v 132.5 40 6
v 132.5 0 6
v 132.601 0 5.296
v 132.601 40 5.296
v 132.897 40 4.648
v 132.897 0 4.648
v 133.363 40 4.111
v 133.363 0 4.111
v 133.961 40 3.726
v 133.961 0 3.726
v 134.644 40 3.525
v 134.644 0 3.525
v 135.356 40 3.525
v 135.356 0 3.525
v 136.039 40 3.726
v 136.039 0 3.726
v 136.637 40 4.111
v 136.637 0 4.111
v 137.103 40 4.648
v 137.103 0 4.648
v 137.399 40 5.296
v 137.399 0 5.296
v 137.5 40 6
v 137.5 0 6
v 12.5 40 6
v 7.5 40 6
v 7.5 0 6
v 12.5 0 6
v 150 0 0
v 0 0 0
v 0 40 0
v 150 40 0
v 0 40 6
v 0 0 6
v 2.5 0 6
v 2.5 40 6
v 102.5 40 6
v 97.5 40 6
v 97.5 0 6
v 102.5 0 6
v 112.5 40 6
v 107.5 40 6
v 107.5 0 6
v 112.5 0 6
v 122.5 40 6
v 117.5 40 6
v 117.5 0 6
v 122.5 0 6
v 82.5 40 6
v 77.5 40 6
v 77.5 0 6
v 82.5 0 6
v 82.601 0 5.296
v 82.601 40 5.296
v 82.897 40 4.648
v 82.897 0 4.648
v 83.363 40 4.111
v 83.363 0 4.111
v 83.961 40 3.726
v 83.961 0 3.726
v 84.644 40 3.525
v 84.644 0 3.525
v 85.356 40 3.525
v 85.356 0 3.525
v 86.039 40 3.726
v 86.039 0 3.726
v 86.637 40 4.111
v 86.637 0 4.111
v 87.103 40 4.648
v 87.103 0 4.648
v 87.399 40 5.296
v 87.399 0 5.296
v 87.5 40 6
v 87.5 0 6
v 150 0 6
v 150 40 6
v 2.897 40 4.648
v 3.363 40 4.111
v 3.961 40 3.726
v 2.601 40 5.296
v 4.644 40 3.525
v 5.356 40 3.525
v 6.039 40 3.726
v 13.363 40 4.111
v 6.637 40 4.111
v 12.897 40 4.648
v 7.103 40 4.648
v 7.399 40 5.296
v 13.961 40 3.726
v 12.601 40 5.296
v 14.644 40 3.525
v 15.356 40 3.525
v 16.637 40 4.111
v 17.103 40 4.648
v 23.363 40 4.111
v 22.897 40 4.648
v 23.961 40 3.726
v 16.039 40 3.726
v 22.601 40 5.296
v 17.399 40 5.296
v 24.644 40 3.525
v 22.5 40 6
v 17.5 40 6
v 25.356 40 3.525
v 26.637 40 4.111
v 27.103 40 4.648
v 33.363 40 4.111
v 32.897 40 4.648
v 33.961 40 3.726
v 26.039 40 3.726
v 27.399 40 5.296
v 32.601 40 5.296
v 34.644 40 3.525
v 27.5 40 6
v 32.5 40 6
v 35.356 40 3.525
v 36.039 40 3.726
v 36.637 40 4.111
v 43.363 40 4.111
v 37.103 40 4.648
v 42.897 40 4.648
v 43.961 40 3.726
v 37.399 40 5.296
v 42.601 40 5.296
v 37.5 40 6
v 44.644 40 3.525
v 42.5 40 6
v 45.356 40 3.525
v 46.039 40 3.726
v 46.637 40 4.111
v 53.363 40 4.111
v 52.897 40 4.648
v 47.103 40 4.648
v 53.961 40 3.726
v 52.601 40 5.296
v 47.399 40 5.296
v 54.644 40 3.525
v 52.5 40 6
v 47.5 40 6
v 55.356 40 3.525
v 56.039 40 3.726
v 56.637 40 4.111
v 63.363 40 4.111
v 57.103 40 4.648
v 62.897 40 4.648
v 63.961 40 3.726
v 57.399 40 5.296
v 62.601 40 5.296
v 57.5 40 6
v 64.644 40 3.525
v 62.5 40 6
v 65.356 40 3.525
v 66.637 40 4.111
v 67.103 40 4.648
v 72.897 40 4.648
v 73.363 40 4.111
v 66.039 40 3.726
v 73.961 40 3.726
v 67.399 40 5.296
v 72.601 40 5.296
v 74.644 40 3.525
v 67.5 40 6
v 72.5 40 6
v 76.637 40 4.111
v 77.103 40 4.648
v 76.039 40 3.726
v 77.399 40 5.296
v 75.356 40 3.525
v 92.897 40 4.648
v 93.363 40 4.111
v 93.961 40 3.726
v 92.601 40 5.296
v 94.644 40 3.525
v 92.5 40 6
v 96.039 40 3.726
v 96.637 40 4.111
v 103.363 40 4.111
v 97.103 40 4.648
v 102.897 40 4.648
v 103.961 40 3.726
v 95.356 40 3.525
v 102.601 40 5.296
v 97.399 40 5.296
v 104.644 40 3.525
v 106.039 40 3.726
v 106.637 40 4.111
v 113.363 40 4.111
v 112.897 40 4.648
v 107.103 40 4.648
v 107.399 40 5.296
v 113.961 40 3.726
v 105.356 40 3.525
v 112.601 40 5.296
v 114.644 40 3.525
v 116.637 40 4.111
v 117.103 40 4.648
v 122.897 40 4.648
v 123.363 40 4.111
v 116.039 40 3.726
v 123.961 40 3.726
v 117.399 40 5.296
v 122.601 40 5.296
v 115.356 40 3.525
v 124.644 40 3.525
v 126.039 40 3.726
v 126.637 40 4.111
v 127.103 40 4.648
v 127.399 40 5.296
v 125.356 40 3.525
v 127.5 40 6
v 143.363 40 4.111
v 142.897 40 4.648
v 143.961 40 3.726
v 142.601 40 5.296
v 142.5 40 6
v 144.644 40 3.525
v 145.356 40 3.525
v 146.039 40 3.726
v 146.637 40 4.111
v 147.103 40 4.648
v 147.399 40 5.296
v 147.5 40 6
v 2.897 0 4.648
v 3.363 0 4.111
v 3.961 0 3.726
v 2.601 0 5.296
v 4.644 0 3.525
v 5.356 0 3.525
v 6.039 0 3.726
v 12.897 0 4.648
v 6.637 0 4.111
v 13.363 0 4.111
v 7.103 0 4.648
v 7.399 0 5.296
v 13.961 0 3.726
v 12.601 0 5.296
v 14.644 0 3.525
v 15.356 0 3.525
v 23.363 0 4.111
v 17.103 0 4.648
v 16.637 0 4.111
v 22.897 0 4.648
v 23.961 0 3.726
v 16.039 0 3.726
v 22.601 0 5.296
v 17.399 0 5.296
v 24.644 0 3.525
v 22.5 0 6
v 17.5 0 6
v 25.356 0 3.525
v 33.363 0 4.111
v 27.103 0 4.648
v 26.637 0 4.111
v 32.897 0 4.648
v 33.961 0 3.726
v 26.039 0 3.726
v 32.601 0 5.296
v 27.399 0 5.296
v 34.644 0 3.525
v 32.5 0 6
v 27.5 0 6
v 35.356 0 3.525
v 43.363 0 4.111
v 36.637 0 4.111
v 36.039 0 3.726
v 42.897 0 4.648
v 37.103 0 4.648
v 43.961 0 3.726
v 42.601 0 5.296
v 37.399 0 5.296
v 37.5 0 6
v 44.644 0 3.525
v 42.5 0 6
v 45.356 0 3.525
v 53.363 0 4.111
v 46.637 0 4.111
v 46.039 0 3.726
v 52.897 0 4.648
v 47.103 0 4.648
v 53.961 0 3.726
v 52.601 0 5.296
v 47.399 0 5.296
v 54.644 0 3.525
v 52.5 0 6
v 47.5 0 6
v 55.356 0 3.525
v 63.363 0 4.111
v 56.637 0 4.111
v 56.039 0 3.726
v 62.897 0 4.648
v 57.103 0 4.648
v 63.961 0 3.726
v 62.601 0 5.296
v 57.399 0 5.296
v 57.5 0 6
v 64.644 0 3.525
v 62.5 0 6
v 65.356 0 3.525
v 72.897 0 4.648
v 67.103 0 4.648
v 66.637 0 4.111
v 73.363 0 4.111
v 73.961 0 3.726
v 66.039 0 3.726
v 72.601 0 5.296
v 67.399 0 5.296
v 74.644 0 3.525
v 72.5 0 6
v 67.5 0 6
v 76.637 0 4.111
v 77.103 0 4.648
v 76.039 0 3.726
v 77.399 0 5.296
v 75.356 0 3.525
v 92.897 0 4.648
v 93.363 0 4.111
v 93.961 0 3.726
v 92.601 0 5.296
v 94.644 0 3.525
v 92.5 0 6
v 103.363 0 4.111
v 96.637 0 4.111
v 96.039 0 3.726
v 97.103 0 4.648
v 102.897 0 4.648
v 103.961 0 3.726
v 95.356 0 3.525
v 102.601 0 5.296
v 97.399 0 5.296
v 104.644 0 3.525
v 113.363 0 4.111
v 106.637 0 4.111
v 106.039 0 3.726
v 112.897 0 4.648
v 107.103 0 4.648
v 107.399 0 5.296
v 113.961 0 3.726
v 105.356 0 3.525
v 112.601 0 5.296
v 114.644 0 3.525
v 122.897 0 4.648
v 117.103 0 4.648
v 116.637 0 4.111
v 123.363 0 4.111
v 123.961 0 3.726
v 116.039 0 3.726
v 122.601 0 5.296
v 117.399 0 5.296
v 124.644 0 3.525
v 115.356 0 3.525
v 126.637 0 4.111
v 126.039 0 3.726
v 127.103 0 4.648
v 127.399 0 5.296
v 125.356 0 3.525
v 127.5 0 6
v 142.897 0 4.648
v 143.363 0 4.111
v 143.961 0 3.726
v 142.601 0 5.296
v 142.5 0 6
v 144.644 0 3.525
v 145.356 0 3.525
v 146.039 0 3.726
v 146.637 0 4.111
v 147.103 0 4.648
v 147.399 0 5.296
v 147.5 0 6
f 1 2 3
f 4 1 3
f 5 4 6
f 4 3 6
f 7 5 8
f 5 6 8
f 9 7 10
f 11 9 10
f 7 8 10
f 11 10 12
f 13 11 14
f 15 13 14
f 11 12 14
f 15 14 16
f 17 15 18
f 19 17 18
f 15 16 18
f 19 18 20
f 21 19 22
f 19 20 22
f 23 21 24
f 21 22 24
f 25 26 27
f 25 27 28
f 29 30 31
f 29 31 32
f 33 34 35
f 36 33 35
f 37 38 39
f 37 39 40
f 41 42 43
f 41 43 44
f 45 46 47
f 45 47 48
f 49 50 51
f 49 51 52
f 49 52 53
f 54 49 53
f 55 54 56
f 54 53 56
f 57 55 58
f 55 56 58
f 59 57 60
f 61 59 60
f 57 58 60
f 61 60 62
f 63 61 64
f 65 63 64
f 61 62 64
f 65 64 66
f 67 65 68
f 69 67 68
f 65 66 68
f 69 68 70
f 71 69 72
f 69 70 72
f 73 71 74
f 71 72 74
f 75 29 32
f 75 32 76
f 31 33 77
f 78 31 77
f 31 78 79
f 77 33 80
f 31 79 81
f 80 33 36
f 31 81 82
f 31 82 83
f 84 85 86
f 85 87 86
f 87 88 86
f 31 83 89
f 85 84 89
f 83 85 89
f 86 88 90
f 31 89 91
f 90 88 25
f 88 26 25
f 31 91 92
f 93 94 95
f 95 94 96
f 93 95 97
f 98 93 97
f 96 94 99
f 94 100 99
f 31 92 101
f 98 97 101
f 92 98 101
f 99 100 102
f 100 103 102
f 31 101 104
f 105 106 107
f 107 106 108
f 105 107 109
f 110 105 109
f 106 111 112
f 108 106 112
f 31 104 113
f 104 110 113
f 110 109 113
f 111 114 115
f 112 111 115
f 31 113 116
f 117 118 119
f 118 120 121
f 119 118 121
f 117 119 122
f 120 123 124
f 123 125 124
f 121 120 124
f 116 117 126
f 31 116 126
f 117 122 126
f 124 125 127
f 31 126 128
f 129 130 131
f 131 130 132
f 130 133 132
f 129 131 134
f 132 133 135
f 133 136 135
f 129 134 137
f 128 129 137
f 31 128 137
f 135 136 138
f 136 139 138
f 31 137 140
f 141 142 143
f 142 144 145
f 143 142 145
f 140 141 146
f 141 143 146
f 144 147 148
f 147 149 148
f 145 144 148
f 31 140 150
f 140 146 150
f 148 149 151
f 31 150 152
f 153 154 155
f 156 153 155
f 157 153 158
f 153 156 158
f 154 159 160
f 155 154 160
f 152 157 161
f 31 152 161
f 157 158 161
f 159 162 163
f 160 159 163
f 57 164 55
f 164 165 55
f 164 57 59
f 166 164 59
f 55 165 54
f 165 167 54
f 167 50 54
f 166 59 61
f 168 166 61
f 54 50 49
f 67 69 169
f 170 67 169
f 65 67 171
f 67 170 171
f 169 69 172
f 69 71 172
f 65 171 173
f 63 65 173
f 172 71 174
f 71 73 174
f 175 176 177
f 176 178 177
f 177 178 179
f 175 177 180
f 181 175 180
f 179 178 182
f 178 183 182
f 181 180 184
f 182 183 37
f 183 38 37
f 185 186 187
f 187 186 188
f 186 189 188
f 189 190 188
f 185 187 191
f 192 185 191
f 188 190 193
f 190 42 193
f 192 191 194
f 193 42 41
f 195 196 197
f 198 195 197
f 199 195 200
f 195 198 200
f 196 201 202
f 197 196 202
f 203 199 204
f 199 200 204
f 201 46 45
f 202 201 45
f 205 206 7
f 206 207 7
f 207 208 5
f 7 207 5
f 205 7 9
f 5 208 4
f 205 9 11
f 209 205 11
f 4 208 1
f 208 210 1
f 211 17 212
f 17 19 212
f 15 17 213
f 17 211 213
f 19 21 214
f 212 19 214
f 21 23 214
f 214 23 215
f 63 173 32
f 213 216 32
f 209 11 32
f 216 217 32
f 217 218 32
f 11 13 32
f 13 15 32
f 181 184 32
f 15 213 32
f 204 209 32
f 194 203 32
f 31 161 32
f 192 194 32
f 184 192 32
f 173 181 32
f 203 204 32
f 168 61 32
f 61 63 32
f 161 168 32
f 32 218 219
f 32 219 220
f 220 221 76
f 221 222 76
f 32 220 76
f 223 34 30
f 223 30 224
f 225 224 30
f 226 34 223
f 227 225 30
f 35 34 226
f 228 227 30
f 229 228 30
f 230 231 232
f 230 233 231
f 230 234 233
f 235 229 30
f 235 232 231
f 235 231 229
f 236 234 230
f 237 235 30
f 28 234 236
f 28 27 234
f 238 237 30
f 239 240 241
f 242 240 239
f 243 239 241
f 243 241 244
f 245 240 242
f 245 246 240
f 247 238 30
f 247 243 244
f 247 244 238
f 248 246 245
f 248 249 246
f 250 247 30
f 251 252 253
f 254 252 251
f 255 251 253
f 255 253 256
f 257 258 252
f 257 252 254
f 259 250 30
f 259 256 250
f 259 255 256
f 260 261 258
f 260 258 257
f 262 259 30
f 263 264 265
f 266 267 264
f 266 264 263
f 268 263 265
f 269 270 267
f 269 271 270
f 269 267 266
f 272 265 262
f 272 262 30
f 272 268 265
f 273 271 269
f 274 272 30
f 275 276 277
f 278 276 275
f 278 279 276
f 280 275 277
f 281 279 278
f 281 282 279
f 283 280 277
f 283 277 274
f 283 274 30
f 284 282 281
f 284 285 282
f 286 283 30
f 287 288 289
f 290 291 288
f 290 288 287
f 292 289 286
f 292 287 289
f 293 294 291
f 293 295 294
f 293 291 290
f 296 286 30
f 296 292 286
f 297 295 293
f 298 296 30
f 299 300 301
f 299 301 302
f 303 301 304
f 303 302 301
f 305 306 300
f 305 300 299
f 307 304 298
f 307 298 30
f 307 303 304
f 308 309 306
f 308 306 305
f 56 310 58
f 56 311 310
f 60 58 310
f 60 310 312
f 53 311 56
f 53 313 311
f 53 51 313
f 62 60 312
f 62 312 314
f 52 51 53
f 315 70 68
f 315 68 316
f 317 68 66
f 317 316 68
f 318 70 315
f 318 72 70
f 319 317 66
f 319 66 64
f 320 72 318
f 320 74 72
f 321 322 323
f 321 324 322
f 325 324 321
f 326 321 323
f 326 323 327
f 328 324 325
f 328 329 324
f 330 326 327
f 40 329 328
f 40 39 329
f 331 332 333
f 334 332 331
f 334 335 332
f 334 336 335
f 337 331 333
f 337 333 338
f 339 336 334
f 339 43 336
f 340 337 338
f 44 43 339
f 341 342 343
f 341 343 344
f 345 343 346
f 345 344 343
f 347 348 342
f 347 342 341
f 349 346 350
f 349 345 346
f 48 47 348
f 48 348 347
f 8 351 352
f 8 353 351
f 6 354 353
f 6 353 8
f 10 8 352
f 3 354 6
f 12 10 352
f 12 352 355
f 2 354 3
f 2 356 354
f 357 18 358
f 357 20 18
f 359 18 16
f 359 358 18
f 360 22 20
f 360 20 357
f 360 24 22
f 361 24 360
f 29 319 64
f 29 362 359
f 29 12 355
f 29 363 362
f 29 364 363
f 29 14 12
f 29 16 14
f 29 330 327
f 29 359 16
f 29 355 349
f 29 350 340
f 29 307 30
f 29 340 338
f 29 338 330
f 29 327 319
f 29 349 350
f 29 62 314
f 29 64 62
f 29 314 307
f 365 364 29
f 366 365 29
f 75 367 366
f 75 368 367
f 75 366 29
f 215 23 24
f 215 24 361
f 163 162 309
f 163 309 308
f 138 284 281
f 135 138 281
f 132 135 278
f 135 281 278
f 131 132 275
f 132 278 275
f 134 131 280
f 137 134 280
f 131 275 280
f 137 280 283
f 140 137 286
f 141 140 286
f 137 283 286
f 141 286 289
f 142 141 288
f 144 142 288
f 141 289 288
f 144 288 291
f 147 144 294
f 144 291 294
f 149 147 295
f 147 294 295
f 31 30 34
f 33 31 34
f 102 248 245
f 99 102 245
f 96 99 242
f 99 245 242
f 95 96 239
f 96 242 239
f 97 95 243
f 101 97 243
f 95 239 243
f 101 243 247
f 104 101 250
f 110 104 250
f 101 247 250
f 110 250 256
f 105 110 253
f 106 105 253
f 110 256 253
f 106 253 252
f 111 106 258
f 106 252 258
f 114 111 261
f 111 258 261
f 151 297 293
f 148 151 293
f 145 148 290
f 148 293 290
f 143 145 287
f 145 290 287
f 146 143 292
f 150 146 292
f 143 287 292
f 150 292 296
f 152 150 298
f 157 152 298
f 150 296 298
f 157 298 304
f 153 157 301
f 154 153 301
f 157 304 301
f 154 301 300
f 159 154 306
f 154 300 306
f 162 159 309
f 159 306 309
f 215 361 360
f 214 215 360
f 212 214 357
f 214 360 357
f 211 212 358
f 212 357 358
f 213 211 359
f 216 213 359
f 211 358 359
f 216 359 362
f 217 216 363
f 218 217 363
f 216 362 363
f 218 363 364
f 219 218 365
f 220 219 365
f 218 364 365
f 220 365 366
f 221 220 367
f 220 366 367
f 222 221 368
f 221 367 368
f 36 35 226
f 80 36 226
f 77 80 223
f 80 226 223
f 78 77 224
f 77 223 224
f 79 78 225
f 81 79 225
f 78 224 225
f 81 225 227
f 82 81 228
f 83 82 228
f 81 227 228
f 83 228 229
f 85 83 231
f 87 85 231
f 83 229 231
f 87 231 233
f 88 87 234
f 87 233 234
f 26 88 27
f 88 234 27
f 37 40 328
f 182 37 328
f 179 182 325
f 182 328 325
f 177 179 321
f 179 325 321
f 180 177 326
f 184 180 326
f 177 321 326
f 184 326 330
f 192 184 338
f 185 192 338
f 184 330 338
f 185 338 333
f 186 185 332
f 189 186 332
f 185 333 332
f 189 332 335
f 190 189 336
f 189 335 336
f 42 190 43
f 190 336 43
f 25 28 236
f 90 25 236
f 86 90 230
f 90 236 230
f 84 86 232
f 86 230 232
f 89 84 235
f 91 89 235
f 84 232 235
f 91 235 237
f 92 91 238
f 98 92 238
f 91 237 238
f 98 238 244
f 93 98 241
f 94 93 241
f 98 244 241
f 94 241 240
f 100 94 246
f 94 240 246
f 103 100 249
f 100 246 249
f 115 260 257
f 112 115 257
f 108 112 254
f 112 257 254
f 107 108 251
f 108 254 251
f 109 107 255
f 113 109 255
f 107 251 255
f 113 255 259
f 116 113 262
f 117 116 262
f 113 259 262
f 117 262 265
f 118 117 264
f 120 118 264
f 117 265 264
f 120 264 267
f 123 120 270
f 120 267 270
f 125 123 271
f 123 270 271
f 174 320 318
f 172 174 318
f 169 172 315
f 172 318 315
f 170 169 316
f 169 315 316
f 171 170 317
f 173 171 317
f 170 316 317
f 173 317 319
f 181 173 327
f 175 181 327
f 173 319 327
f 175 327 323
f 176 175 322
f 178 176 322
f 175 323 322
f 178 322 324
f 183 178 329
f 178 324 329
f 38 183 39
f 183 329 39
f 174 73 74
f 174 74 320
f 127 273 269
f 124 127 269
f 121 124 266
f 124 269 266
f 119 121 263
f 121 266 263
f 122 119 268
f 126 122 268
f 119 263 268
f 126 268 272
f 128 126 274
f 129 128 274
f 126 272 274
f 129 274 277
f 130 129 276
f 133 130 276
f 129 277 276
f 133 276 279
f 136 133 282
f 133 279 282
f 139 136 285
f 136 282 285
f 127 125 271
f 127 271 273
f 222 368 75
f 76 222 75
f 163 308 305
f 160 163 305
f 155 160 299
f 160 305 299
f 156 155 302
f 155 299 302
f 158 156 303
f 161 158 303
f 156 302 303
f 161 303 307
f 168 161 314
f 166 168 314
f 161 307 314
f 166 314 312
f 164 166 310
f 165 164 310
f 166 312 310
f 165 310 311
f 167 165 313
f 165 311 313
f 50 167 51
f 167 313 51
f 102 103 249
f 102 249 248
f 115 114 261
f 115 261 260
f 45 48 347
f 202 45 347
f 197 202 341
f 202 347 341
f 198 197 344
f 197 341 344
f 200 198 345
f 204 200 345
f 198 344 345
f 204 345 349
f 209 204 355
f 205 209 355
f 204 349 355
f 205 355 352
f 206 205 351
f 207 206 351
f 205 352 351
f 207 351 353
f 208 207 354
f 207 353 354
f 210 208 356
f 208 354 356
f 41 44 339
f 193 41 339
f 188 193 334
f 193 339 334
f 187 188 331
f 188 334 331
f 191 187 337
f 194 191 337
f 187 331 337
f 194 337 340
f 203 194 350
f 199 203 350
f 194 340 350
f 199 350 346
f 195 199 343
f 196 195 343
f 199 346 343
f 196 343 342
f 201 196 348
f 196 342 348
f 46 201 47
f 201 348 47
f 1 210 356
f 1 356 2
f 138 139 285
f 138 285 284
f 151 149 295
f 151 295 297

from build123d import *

# Parameters (mm, degrees)
F0_W     = 150
F0_H     = 6
F1_DEPTH = 40
F3_DEPTH = 40.001


with BuildPart() as f1:
    # F0 (on Front) → F1 (new body)
    with BuildSketch(Plane.XZ):
        with Locations((75, 3)):
            Rectangle(F0_W, F0_H)
    extrude(amount=-F1_DEPTH)

    # F2 (on face) → F3 (cut, through all)
    with BuildSketch(Plane.XZ):
        with BuildLine():
            ThreePointArc((2.5, 6), (5, 3.5), (7.5, 6))
            Line((7.5, 6), (2.5, 6))
        make_face()
        with BuildLine():
            Line((17.5, 6), (12.5, 6))
            ThreePointArc((12.5, 6), (15, 3.5), (17.5, 6))
        make_face()
        with BuildLine():
            Line((27.5, 6), (22.5, 6))
            ThreePointArc((22.5, 6), (25, 3.5), (27.5, 6))
        make_face()
        with BuildLine():
            Line((37.5, 6), (32.5, 6))
            ThreePointArc((32.5, 6), (35, 3.5), (37.5, 6))
        make_face()
        with BuildLine():
            Line((142.5, 6), (147.5, 6))
            ThreePointArc((147.5, 6), (145, 8.5), (142.5, 6))
        make_face()
        with BuildLine():
            ThreePointArc((142.5, 6), (145, 3.5), (147.5, 6))
            Line((147.5, 6), (142.5, 6))
        make_face()
        with BuildLine():
            Line((47.5, 6), (42.5, 6))
            ThreePointArc((42.5, 6), (45, 3.5), (47.5, 6))
        make_face()
        with BuildLine():
            Line((132.5, 6), (137.5, 6))
            ThreePointArc((137.5, 6), (135, 8.5), (132.5, 6))
        make_face()
        with BuildLine():
            ThreePointArc((132.5, 6), (135, 3.5), (137.5, 6))
            Line((137.5, 6), (132.5, 6))
        make_face()
        with BuildLine():
            Line((57.5, 6), (52.5, 6))
            ThreePointArc((52.5, 6), (55, 3.5), (57.5, 6))
        make_face()
        with BuildLine():
            Line((122.5, 6), (127.5, 6))
            ThreePointArc((127.5, 6), (125, 8.5), (122.5, 6))
        make_face()
        with BuildLine():
            ThreePointArc((122.5, 6), (125, 3.5), (127.5, 6))
            Line((127.5, 6), (122.5, 6))
        make_face()
        with BuildLine():
            Line((67.5, 6), (62.5, 6))
            ThreePointArc((62.5, 6), (65, 3.5), (67.5, 6))
        make_face()
        with BuildLine():
            Line((112.5, 6), (117.5, 6))
            ThreePointArc((117.5, 6), (115, 8.5), (112.5, 6))
        make_face()
        with BuildLine():
            ThreePointArc((112.5, 6), (115, 3.5), (117.5, 6))
            Line((117.5, 6), (112.5, 6))
        make_face()
        with BuildLine():
            Line((77.5, 6), (72.5, 6))
            ThreePointArc((72.5, 6), (75, 3.5), (77.5, 6))
        make_face()
        with BuildLine():
            ThreePointArc((102.5, 6), (105, 3.5), (107.5, 6))
            Line((107.5, 6), (102.5, 6))
        make_face()
        with BuildLine():
            Line((87.5, 6), (82.5, 6))
            ThreePointArc((82.5, 6), (85, 3.5), (87.5, 6))
        make_face()
        with BuildLine():
            ThreePointArc((92.5, 6), (95, 3.5), (97.5, 6))
            Line((97.5, 6), (92.5, 6))
        make_face()
    extrude(amount=-F3_DEPTH, mode=Mode.SUBTRACT)


solid = f1.part
